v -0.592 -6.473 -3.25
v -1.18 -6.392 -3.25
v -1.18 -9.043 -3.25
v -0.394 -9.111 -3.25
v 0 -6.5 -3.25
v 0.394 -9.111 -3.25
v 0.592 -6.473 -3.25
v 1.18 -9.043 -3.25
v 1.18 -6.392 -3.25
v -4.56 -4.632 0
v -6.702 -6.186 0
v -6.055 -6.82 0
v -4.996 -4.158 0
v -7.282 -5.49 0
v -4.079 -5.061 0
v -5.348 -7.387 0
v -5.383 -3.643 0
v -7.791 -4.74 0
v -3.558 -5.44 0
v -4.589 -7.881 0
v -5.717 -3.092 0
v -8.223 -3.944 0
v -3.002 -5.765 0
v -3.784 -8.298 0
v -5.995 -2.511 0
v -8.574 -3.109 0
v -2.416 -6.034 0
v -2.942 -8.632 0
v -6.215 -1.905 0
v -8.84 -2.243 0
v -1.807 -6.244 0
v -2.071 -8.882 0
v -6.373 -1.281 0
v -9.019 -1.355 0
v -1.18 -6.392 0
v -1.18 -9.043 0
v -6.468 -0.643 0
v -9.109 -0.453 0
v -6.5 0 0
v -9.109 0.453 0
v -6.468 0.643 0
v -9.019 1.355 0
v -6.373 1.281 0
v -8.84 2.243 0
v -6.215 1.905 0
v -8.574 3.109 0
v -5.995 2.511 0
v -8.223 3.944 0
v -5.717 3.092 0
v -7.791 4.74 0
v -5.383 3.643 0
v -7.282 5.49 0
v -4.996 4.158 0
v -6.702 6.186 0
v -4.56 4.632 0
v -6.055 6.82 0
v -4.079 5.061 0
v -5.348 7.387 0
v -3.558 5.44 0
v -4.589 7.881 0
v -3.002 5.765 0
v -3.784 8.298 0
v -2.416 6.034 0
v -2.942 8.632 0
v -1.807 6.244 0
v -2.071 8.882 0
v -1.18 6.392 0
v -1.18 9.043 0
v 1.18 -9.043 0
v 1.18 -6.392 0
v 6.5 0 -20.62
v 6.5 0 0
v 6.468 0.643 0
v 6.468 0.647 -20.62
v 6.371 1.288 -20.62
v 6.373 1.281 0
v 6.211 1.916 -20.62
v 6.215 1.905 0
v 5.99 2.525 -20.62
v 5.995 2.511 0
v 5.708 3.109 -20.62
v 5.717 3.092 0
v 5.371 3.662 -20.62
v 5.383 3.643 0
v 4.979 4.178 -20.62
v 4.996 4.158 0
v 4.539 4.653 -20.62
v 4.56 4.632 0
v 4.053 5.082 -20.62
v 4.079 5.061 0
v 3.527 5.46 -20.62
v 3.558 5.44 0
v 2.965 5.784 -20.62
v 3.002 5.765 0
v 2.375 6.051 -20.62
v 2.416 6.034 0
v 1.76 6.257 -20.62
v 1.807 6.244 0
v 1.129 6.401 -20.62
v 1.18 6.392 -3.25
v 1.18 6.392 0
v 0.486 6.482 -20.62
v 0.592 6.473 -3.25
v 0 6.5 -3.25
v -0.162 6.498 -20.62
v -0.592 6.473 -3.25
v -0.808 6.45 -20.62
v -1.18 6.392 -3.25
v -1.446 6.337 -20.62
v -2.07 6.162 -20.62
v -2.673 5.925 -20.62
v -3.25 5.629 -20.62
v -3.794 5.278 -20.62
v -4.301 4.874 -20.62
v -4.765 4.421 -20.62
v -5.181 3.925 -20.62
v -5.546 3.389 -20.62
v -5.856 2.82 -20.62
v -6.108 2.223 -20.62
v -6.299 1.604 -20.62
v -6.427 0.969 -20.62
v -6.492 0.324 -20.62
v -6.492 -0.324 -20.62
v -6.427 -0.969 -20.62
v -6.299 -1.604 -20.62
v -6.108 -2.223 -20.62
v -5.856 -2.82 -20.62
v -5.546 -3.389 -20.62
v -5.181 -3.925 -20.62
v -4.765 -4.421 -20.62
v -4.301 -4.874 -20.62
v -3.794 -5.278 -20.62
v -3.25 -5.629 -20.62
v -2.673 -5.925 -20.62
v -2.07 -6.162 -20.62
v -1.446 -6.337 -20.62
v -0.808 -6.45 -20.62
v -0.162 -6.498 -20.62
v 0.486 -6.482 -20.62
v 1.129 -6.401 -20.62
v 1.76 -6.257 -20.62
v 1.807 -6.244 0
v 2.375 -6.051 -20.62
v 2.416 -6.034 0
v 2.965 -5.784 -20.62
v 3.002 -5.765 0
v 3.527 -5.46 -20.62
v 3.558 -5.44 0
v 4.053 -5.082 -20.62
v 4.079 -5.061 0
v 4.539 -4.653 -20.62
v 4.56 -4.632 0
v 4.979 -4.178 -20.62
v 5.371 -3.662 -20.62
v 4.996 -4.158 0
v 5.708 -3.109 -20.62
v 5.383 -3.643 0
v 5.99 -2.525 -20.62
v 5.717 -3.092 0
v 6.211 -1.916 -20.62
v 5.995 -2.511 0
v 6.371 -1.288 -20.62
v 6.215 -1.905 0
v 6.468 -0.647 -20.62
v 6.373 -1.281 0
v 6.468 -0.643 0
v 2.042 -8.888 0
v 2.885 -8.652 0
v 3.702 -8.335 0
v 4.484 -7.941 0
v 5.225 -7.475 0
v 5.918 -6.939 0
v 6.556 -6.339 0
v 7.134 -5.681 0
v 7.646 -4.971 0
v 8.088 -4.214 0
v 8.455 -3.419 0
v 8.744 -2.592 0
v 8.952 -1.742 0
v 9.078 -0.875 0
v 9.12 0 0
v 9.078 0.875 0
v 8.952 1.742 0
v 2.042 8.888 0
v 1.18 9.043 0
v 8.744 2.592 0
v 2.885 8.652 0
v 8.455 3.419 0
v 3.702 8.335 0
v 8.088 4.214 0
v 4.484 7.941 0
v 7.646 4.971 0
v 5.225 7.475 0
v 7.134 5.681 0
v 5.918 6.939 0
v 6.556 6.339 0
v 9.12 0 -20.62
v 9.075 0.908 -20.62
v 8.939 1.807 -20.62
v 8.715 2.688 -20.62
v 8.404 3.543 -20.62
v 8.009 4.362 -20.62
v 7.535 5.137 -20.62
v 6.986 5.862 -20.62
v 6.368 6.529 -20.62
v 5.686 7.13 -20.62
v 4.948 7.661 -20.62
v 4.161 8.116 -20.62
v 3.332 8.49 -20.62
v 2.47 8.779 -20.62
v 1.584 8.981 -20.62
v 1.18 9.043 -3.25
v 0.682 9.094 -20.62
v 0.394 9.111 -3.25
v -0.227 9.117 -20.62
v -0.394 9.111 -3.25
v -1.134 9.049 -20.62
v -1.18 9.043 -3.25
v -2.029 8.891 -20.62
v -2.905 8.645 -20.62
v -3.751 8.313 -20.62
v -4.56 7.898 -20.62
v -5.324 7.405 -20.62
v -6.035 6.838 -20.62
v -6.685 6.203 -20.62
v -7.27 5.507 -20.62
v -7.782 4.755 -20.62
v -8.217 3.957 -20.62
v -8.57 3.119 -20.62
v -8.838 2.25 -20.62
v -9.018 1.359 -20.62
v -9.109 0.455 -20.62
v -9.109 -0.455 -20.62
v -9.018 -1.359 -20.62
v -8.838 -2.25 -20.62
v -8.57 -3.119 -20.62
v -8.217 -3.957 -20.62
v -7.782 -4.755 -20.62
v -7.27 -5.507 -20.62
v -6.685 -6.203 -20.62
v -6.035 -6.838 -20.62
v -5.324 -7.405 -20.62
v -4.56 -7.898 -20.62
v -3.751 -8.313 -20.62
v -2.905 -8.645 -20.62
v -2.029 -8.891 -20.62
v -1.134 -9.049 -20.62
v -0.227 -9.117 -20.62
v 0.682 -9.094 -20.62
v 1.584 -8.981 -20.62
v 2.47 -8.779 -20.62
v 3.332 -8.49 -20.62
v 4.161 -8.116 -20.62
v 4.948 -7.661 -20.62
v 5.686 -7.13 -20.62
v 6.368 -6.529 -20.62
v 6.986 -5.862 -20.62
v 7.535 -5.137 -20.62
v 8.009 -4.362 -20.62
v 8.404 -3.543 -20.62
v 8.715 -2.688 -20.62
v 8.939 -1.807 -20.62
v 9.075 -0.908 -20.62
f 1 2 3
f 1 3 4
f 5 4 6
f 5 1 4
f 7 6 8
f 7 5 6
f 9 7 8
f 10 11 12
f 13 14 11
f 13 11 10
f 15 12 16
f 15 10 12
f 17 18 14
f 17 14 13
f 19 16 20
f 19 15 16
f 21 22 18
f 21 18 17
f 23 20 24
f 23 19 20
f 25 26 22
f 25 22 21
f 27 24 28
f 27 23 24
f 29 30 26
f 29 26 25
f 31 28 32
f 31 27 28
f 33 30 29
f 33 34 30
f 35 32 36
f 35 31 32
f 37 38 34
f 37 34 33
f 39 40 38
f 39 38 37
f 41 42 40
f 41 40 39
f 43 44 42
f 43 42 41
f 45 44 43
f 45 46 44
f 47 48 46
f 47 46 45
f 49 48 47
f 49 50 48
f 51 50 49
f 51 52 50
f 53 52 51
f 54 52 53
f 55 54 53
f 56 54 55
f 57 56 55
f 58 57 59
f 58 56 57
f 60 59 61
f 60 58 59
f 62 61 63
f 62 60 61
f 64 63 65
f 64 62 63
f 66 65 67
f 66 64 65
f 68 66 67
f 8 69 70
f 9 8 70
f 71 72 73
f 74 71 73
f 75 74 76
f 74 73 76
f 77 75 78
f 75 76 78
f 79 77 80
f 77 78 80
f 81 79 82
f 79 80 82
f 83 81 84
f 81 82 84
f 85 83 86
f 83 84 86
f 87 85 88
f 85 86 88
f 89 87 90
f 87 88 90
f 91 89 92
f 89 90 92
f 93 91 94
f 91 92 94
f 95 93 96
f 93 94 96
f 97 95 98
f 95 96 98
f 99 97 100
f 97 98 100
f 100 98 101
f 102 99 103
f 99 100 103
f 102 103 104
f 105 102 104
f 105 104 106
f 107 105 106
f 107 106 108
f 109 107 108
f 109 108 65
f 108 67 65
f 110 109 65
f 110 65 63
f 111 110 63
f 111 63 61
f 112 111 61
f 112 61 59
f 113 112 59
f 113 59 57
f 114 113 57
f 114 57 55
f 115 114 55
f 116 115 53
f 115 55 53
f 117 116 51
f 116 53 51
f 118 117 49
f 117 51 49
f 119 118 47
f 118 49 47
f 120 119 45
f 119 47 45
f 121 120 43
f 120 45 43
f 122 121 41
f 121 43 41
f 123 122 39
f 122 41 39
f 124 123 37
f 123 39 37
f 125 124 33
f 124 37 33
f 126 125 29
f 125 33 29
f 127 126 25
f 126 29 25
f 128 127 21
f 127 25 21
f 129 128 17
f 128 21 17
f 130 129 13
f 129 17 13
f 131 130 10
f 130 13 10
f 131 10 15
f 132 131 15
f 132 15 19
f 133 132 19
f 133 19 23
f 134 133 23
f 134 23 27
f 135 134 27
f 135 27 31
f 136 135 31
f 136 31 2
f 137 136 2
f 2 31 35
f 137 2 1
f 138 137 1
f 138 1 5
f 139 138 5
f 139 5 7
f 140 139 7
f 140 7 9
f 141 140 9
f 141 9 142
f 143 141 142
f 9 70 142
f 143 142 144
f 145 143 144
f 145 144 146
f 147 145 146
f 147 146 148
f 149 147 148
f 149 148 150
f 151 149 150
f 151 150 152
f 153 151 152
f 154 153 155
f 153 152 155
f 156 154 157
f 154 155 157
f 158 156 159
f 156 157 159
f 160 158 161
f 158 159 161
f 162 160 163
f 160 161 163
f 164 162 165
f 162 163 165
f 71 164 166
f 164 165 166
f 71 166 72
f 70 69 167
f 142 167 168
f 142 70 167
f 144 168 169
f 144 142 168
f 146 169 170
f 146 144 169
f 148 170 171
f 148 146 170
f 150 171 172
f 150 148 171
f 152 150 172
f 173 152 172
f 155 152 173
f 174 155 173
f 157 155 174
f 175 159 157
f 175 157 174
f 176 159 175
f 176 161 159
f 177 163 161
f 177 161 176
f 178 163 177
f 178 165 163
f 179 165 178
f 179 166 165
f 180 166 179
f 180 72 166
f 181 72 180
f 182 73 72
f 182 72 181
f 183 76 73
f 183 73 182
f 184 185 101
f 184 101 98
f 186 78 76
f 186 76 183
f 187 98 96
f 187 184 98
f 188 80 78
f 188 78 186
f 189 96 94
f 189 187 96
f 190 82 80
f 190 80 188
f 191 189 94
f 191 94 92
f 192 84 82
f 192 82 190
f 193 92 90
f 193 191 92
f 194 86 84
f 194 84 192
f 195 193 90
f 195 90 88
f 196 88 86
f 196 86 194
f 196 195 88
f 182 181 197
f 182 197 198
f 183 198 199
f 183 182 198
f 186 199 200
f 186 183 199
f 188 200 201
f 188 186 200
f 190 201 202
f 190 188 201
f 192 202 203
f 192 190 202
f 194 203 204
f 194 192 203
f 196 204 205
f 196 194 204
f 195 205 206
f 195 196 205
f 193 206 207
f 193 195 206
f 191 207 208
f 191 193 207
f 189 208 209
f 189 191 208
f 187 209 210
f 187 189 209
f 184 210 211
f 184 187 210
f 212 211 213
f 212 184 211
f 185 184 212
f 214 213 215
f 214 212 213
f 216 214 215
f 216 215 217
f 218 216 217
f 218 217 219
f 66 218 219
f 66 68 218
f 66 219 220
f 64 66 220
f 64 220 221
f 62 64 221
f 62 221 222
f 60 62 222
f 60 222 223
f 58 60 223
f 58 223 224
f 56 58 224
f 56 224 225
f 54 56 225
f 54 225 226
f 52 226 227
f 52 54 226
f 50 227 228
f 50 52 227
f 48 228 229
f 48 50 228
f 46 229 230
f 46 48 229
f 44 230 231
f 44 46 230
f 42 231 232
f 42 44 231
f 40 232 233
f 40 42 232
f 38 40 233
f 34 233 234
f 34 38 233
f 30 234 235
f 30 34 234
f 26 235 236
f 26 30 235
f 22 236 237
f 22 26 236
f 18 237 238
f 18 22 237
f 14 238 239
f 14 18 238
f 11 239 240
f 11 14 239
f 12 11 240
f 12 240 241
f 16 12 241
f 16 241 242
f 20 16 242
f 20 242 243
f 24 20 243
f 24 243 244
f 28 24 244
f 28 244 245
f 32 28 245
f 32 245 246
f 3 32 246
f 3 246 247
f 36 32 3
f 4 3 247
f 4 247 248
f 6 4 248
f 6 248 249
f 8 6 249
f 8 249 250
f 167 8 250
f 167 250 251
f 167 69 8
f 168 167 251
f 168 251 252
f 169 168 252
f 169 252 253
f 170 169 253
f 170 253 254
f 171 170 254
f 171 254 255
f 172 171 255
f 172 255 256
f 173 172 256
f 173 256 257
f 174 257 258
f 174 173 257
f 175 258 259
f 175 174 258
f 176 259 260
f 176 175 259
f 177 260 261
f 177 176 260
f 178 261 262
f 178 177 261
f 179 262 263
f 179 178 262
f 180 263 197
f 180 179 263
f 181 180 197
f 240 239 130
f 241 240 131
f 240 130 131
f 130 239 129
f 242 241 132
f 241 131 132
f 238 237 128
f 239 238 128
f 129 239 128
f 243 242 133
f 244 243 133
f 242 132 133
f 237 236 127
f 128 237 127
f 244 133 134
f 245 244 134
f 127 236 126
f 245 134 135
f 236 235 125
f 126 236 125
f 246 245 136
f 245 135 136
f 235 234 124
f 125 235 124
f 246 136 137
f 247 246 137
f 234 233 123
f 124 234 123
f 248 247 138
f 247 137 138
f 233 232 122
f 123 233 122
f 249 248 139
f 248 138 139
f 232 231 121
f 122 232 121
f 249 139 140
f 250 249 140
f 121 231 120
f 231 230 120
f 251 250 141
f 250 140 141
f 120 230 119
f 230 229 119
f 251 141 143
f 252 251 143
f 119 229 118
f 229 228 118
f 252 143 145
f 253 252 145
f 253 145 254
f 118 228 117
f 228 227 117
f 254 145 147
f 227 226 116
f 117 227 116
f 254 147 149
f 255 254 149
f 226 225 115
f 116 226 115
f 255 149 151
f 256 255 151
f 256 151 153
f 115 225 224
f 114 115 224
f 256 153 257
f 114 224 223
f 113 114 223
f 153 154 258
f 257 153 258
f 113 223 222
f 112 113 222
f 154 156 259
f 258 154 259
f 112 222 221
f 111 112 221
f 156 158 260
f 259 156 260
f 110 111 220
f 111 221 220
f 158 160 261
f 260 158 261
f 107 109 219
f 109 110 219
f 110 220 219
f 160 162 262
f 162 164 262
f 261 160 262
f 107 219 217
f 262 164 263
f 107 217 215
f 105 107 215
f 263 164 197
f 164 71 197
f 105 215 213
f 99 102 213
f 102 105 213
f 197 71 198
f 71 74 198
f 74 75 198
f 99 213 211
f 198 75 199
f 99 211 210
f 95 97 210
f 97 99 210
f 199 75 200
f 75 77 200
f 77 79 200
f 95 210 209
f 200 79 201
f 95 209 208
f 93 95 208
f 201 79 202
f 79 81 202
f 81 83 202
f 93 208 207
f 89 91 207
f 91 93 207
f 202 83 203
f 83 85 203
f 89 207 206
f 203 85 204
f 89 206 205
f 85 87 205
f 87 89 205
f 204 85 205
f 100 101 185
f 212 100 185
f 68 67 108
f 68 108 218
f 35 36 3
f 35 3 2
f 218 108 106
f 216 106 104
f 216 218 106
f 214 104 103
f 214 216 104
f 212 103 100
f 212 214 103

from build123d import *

# Parameters (mm, degrees)
CROQUIS1_R            = 9.12
CROQUIS1_R_2          = 6.5
EXTRUIR_L_MINA1_DEPTH = 20.62
CROQUIS2_W            = 2.36
CROQUIS2_H            = 20
CORTAR_EXTRUIR1_DEPTH = 3.25


with BuildPart() as part:
    # Croquis1 → Extruir-Lámina1 (new body)
    with BuildSketch(Plane.XY):
        Circle(CROQUIS1_R)
        Circle(CROQUIS1_R_2, mode=Mode.SUBTRACT)
    extrude(amount=-EXTRUIR_L_MINA1_DEPTH)

    # Croquis2 → Cortar-Extruir1 (cut)
    with BuildSketch(Plane.XY):
        Rectangle(CROQUIS2_W, CROQUIS2_H)
    extrude(amount=-CORTAR_EXTRUIR1_DEPTH, mode=Mode.SUBTRACT)


solid = part.part
